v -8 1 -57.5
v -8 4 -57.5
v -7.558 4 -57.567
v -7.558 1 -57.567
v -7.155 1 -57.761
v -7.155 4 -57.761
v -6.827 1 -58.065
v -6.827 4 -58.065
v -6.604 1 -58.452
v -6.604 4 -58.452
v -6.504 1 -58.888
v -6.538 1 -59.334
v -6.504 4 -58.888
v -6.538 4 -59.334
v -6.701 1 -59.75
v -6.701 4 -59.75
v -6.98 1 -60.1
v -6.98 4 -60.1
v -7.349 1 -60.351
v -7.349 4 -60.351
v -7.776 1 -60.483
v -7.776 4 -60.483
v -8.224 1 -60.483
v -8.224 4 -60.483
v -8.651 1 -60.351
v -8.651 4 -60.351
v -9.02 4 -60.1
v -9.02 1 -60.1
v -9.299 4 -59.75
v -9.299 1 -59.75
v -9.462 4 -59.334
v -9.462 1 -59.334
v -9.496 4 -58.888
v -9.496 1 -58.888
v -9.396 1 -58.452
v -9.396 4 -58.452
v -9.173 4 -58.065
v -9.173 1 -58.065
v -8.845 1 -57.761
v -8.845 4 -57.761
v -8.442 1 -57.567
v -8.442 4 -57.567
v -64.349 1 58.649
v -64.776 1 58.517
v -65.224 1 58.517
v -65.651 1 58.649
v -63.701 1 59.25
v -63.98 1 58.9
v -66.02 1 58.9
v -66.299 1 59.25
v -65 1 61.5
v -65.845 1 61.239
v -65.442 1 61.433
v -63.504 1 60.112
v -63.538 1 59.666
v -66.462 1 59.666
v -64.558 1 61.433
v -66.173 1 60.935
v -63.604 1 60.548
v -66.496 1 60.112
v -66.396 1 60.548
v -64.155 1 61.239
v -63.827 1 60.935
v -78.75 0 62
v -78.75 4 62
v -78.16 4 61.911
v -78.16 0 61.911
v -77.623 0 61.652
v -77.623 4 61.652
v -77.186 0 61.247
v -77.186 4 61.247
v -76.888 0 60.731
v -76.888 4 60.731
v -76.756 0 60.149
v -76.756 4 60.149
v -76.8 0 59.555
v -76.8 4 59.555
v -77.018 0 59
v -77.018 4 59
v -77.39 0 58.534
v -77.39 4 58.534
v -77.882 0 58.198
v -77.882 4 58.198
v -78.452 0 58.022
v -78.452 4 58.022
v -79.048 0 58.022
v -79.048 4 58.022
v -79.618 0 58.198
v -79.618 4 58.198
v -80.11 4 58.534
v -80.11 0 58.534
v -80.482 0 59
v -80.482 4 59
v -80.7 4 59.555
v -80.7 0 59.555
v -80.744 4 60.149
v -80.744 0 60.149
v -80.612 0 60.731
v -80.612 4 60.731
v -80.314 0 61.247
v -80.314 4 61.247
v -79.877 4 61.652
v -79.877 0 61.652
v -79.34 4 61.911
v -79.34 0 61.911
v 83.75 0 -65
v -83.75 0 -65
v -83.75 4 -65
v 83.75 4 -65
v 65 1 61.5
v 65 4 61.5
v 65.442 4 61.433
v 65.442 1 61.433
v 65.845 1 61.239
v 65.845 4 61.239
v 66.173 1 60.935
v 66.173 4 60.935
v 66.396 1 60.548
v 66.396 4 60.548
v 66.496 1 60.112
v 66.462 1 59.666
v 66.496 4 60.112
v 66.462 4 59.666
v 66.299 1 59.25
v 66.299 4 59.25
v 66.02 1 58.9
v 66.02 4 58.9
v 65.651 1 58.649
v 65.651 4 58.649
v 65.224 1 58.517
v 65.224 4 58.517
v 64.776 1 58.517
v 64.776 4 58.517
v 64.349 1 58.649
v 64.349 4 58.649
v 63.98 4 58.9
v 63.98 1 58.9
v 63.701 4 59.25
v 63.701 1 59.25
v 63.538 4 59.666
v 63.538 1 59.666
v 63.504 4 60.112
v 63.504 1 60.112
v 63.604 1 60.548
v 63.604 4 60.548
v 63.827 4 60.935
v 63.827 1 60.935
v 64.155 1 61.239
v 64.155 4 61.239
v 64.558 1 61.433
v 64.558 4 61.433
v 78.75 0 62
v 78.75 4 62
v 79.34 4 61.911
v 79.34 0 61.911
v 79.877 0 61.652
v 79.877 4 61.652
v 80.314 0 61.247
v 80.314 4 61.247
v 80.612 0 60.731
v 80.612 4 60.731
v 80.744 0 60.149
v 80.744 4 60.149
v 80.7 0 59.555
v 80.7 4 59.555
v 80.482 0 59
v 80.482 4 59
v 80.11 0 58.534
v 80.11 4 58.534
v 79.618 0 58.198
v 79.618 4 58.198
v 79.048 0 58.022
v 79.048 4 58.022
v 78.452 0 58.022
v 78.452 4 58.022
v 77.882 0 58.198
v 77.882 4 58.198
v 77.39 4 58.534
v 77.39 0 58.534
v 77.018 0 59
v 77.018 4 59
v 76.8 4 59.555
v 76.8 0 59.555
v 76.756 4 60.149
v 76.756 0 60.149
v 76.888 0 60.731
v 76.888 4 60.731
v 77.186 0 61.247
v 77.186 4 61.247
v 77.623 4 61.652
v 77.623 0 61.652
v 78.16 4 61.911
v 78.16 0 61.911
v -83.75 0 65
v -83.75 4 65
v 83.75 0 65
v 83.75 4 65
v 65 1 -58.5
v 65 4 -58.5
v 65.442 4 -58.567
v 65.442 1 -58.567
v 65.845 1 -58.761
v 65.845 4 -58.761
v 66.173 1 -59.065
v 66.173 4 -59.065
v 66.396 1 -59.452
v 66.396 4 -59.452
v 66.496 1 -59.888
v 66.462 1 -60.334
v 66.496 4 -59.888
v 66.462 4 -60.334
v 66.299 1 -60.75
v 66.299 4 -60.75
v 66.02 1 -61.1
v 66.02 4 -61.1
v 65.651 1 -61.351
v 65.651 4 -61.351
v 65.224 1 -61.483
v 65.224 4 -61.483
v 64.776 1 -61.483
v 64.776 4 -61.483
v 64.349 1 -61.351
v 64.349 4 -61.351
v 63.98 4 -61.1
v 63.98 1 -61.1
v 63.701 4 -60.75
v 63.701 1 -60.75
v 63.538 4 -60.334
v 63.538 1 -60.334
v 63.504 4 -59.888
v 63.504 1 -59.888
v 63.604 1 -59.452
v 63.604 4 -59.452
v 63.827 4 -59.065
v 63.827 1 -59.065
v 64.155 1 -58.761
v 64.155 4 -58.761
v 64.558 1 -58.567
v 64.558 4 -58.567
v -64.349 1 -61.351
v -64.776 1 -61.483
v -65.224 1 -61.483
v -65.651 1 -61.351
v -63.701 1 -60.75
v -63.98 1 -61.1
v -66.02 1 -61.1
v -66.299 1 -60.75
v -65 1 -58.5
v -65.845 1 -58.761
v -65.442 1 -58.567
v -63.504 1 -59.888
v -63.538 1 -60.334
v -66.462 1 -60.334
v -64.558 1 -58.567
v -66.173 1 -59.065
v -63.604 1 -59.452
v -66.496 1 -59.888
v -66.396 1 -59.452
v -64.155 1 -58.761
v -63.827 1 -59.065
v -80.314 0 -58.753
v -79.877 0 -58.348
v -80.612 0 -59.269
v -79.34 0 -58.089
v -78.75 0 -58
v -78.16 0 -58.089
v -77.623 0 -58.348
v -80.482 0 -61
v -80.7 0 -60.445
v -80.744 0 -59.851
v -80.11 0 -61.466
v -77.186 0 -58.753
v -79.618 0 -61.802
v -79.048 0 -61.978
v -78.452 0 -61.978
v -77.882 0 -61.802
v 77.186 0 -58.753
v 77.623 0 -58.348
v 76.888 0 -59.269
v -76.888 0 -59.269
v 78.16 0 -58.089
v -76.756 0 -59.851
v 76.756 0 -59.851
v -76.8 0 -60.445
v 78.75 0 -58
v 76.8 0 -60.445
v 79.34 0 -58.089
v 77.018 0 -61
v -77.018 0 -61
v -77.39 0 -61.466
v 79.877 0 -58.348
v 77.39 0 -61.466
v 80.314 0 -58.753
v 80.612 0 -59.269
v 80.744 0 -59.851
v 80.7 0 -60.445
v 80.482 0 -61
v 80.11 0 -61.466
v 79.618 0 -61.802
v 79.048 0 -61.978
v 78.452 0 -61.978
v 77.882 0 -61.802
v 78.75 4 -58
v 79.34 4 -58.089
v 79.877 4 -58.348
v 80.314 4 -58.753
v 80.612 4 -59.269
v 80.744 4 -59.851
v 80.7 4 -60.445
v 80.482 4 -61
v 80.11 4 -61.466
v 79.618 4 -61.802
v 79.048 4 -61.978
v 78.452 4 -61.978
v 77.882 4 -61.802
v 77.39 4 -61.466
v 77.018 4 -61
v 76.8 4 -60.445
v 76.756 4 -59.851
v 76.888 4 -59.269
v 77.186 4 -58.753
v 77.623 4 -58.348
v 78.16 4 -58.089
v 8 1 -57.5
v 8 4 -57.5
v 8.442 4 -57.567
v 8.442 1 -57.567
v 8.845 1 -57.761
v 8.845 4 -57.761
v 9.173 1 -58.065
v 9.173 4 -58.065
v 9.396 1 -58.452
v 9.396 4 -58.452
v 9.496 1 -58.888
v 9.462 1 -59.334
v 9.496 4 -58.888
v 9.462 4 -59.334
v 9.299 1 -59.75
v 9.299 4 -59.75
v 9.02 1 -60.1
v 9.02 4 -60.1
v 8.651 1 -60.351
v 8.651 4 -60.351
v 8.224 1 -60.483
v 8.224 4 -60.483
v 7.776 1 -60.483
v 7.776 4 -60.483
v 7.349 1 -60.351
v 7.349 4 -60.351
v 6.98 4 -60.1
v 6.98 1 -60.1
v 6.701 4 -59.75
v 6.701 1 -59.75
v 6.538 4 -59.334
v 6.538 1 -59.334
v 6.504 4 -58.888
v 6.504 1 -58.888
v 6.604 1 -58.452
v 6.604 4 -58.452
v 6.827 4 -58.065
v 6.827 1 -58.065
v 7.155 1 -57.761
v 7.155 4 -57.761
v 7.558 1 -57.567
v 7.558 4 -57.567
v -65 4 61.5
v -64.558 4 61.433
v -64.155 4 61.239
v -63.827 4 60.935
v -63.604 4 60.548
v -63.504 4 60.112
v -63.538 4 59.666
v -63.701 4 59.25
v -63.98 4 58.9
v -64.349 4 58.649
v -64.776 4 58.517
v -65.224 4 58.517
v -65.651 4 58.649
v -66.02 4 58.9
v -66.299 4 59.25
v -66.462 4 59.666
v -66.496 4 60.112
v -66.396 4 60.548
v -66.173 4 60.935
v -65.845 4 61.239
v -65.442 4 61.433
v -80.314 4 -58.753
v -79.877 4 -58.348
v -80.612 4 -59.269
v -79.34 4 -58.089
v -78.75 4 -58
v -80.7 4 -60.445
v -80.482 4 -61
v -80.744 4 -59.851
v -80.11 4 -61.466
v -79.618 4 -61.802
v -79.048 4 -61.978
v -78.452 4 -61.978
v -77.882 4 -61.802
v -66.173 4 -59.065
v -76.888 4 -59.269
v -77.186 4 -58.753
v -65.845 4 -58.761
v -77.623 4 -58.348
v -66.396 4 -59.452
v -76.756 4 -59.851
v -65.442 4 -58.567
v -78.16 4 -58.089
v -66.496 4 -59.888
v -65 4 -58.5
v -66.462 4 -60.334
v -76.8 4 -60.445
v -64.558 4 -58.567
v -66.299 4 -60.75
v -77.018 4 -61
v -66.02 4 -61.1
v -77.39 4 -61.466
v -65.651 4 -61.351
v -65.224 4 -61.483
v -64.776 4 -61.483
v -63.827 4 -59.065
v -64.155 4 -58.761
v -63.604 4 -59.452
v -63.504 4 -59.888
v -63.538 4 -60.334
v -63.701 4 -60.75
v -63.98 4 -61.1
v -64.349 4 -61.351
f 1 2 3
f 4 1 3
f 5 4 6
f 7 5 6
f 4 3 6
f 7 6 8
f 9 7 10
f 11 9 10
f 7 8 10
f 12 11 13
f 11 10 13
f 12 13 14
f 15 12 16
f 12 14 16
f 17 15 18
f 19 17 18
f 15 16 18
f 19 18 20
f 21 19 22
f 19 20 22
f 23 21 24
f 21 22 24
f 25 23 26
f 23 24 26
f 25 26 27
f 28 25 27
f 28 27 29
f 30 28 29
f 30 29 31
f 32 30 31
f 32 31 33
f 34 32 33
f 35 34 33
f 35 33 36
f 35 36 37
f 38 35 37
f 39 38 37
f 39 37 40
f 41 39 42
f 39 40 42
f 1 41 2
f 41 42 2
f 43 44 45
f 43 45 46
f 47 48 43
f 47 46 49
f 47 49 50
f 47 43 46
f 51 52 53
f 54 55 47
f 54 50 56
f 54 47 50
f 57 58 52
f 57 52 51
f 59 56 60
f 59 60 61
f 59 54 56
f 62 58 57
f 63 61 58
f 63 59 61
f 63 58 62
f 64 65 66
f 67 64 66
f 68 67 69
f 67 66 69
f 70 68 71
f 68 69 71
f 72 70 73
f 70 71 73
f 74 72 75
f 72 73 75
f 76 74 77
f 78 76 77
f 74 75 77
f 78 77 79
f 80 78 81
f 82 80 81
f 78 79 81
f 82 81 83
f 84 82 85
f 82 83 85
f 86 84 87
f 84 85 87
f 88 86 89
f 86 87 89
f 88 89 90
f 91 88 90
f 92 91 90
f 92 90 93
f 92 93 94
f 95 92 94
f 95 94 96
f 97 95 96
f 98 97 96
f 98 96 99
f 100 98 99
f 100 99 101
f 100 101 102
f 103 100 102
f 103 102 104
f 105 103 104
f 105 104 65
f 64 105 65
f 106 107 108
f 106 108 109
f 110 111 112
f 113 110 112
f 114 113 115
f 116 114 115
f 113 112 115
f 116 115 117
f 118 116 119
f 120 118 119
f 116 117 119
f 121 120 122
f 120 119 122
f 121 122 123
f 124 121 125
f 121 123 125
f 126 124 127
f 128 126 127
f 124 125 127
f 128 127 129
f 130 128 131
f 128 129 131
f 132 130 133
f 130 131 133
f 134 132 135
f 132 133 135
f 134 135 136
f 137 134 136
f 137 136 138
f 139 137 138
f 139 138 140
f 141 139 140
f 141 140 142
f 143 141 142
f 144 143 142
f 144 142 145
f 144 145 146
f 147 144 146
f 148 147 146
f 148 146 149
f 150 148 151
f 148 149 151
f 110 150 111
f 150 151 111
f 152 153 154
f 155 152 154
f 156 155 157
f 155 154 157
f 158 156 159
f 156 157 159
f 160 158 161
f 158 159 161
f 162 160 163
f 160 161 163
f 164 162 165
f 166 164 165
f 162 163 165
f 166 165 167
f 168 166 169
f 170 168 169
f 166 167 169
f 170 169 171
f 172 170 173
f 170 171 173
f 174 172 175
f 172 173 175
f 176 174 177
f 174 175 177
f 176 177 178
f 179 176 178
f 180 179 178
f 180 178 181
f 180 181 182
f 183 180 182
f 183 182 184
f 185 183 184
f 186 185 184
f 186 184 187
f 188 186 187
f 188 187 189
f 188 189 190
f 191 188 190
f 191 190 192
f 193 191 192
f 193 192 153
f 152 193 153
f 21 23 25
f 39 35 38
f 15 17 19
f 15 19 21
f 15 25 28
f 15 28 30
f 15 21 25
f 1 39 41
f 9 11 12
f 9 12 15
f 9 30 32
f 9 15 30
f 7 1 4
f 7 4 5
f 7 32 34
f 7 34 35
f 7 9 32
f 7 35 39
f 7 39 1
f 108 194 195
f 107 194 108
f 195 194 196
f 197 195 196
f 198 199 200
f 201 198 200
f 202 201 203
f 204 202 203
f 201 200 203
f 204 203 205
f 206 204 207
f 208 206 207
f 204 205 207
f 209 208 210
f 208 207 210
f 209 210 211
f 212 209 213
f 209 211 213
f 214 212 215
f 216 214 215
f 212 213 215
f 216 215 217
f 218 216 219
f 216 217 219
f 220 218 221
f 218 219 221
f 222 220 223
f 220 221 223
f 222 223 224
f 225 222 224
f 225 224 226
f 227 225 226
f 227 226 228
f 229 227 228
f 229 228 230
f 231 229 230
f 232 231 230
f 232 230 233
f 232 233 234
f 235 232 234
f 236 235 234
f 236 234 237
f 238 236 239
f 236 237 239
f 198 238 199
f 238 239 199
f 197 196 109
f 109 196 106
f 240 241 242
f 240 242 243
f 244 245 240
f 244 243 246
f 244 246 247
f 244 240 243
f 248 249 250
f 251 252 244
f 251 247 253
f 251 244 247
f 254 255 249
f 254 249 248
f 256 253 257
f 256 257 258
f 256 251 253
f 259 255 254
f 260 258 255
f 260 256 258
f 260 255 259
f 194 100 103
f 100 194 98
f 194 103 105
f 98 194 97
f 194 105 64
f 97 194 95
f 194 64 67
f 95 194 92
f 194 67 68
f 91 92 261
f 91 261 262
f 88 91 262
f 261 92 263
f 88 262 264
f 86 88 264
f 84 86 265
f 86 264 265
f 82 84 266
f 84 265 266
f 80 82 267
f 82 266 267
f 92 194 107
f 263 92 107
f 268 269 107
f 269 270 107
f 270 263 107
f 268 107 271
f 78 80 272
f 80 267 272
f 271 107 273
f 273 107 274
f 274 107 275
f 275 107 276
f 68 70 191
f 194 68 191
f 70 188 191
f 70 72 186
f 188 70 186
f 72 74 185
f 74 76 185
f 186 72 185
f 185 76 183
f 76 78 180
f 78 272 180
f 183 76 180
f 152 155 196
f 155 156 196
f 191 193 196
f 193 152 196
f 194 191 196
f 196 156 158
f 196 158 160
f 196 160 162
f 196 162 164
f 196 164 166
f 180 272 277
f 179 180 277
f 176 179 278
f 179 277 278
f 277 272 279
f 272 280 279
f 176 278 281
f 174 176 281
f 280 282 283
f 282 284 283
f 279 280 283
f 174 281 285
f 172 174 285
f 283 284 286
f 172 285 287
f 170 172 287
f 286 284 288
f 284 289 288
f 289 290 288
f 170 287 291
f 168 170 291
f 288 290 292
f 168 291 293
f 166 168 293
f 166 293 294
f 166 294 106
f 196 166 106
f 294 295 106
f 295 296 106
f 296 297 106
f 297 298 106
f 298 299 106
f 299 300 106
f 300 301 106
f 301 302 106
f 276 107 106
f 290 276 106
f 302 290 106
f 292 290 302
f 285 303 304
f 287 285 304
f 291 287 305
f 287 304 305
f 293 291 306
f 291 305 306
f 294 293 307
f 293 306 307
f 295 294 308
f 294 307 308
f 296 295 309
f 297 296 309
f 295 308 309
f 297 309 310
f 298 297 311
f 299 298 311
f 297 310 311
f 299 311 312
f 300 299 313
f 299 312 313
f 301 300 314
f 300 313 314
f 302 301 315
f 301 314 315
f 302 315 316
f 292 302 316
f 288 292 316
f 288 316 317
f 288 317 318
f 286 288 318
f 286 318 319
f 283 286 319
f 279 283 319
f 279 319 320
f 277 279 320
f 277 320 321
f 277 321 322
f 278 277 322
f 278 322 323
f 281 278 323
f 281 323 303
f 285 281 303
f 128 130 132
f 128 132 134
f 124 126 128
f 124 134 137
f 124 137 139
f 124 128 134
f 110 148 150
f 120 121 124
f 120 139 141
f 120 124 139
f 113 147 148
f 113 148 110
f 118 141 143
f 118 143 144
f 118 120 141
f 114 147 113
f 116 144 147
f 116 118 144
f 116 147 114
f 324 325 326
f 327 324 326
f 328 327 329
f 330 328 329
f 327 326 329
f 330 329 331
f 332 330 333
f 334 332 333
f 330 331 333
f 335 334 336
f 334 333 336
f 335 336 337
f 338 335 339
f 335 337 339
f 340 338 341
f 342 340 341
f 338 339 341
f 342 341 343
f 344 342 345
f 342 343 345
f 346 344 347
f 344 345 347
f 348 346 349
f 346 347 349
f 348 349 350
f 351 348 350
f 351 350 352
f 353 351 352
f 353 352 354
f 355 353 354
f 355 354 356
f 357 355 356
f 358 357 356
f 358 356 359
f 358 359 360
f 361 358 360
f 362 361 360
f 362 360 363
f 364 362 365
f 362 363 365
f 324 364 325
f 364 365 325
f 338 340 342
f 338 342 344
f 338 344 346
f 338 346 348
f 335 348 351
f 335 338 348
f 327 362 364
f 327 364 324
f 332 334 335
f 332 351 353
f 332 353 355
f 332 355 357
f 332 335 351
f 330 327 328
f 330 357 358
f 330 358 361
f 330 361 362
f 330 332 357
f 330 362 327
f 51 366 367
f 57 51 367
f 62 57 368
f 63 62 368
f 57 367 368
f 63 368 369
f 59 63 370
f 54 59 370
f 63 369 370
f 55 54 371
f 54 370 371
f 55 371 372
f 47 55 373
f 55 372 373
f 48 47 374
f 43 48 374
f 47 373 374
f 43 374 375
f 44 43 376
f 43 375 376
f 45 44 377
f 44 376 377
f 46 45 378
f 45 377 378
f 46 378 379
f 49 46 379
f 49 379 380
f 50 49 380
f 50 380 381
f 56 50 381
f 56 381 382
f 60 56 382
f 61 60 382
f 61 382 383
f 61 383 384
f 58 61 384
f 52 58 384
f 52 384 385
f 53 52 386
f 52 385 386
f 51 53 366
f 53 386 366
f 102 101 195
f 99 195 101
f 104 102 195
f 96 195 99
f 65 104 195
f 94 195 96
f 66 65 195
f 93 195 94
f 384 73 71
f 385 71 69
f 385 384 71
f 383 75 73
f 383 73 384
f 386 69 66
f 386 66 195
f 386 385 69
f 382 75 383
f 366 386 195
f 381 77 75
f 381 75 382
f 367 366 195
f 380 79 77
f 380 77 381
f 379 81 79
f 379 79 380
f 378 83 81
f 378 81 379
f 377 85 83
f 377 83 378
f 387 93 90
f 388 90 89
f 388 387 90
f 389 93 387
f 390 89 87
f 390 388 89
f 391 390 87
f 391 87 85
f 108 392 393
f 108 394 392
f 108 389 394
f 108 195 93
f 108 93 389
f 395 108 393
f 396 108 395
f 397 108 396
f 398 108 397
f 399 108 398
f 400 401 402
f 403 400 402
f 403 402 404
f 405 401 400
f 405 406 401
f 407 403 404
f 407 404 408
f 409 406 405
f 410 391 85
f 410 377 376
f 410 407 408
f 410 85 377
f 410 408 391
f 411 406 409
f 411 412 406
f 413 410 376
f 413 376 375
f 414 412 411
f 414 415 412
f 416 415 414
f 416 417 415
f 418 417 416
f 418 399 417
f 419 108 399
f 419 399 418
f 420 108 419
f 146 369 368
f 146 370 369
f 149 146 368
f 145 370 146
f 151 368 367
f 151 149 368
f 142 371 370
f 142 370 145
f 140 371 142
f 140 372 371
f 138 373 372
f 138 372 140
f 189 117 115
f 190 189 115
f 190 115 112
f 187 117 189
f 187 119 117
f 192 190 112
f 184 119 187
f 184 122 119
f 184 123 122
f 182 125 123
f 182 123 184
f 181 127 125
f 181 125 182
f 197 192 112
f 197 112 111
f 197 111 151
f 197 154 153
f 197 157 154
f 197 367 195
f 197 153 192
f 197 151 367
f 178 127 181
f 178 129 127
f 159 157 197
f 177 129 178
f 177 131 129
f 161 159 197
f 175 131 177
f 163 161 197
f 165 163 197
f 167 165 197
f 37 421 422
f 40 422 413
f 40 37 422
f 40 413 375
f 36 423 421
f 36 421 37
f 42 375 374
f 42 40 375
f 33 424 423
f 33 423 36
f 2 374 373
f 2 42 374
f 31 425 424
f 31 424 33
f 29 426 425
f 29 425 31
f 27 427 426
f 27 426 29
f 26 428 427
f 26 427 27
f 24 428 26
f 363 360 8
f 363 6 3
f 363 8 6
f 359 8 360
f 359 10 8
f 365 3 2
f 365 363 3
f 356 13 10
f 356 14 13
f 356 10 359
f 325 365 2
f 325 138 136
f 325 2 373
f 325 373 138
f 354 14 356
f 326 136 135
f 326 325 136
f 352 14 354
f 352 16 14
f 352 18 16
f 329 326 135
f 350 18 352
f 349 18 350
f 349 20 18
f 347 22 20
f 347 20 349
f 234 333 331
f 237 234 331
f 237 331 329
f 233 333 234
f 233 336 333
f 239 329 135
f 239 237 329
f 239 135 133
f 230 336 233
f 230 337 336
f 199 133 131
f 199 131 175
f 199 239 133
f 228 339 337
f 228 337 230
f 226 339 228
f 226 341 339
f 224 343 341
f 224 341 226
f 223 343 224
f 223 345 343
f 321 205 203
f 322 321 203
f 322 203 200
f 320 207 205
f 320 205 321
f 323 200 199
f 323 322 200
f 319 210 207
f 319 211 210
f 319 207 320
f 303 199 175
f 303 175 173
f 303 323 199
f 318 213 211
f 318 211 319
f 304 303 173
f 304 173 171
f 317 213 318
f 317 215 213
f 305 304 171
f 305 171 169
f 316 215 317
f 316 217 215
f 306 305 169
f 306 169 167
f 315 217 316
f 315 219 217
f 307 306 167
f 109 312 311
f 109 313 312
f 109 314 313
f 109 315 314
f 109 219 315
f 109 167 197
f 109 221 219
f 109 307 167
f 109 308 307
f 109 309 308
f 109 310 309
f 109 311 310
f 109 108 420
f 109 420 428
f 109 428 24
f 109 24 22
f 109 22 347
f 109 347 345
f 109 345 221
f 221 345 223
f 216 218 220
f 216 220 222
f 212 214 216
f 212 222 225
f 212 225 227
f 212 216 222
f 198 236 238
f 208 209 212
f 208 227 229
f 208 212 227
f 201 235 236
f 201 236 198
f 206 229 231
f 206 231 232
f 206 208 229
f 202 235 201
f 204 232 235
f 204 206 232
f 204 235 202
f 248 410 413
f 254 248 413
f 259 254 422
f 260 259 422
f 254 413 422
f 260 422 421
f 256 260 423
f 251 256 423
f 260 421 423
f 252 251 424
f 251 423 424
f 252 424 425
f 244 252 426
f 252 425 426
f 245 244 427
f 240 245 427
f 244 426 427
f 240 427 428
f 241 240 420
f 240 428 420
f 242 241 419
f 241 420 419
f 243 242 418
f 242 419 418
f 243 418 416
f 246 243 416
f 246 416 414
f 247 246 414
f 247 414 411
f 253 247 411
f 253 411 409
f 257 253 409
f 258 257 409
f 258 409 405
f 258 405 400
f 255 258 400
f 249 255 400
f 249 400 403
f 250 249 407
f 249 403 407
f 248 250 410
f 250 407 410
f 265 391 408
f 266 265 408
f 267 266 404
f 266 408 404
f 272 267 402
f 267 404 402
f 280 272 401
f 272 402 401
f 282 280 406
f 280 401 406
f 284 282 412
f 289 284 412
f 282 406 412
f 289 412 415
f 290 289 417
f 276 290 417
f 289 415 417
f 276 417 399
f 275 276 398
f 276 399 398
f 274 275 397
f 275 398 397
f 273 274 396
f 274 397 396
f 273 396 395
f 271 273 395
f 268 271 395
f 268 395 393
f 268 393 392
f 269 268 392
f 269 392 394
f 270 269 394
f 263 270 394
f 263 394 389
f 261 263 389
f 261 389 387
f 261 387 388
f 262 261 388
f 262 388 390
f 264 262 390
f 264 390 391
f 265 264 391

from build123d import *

# Parameters (mm, degrees)
SKETCH1_W           = 167.5
SKETCH1_H           = 130
BOSS_EXTRUDE1_DEPTH = 4
SKETCH2_R           = 1.5
CUT_EXTRUDE1_DEPTH  = 3
SKETCH3_R           = 1.5
CUT_EXTRUDE2_DEPTH  = 3
SKETCH5_R           = 2
CUT_EXTRUDE3_DEPTH  = 10


with BuildPart() as part:
    # Sketch1 → Boss-Extrude1 (new body)
    with BuildSketch(Plane(origin=(0, 0, 0), x_dir=(1, 0, 0), z_dir=(0, 1, 0))):
        Rectangle(SKETCH1_W, SKETCH1_H)
    extrude(amount=BOSS_EXTRUDE1_DEPTH)

    # Sketch2 → Cut-Extrude1 (cut)
    with BuildSketch(Plane(origin=(0, 4, 0), x_dir=(1, 0, 0), z_dir=(0, 1, 0))):
        with Locations(Location((-65, -60, 0), (0, 0, 270))):
            Circle(SKETCH2_R)
        with Locations(Location((65, -60, 0), (0, 0, 270))):
            Circle(SKETCH2_R)
        with Locations(Location((65, 60, 0), (0, 0, 270))):
            Circle(SKETCH2_R)
        with Locations(Location((-65, 60, 0), (0, 0, 270))):
            Circle(SKETCH2_R)
    extrude(amount=-CUT_EXTRUDE1_DEPTH, mode=Mode.SUBTRACT)

    # Sketch3 → Cut-Extrude2 (cut)
    with BuildSketch(Plane(origin=(0, 4, 0), x_dir=(1, 0, 0), z_dir=(0, 1, 0))):
        with Locations(Location((-8, 59, 0), (0, 0, 270))):
            Circle(SKETCH3_R)
        with Locations(Location((8, 59, 0), (0, 0, 270))):
            Circle(SKETCH3_R)
    extrude(amount=-CUT_EXTRUDE2_DEPTH, mode=Mode.SUBTRACT)

    # Sketch5 → Cut-Extrude3 (cut)
    with BuildSketch(Plane(origin=(0, 4, 0), x_dir=(1, 0, 0), z_dir=(0, 1, 0))):
        with Locations(Location((-78.75, 60, 0), (0, 0, 270))):
            Circle(SKETCH5_R)
        with Locations(Location((78.75, 60, 0), (0, 0, 270))):
            Circle(SKETCH5_R)
        with Locations(Location((78.75, -60, 0), (0, 0, 270))):
            Circle(SKETCH5_R)
        with Locations(Location((-78.75, -60, 0), (0, 0, 270))):
            Circle(SKETCH5_R)
    extrude(amount=-CUT_EXTRUDE3_DEPTH, mode=Mode.SUBTRACT)


solid = part.part
